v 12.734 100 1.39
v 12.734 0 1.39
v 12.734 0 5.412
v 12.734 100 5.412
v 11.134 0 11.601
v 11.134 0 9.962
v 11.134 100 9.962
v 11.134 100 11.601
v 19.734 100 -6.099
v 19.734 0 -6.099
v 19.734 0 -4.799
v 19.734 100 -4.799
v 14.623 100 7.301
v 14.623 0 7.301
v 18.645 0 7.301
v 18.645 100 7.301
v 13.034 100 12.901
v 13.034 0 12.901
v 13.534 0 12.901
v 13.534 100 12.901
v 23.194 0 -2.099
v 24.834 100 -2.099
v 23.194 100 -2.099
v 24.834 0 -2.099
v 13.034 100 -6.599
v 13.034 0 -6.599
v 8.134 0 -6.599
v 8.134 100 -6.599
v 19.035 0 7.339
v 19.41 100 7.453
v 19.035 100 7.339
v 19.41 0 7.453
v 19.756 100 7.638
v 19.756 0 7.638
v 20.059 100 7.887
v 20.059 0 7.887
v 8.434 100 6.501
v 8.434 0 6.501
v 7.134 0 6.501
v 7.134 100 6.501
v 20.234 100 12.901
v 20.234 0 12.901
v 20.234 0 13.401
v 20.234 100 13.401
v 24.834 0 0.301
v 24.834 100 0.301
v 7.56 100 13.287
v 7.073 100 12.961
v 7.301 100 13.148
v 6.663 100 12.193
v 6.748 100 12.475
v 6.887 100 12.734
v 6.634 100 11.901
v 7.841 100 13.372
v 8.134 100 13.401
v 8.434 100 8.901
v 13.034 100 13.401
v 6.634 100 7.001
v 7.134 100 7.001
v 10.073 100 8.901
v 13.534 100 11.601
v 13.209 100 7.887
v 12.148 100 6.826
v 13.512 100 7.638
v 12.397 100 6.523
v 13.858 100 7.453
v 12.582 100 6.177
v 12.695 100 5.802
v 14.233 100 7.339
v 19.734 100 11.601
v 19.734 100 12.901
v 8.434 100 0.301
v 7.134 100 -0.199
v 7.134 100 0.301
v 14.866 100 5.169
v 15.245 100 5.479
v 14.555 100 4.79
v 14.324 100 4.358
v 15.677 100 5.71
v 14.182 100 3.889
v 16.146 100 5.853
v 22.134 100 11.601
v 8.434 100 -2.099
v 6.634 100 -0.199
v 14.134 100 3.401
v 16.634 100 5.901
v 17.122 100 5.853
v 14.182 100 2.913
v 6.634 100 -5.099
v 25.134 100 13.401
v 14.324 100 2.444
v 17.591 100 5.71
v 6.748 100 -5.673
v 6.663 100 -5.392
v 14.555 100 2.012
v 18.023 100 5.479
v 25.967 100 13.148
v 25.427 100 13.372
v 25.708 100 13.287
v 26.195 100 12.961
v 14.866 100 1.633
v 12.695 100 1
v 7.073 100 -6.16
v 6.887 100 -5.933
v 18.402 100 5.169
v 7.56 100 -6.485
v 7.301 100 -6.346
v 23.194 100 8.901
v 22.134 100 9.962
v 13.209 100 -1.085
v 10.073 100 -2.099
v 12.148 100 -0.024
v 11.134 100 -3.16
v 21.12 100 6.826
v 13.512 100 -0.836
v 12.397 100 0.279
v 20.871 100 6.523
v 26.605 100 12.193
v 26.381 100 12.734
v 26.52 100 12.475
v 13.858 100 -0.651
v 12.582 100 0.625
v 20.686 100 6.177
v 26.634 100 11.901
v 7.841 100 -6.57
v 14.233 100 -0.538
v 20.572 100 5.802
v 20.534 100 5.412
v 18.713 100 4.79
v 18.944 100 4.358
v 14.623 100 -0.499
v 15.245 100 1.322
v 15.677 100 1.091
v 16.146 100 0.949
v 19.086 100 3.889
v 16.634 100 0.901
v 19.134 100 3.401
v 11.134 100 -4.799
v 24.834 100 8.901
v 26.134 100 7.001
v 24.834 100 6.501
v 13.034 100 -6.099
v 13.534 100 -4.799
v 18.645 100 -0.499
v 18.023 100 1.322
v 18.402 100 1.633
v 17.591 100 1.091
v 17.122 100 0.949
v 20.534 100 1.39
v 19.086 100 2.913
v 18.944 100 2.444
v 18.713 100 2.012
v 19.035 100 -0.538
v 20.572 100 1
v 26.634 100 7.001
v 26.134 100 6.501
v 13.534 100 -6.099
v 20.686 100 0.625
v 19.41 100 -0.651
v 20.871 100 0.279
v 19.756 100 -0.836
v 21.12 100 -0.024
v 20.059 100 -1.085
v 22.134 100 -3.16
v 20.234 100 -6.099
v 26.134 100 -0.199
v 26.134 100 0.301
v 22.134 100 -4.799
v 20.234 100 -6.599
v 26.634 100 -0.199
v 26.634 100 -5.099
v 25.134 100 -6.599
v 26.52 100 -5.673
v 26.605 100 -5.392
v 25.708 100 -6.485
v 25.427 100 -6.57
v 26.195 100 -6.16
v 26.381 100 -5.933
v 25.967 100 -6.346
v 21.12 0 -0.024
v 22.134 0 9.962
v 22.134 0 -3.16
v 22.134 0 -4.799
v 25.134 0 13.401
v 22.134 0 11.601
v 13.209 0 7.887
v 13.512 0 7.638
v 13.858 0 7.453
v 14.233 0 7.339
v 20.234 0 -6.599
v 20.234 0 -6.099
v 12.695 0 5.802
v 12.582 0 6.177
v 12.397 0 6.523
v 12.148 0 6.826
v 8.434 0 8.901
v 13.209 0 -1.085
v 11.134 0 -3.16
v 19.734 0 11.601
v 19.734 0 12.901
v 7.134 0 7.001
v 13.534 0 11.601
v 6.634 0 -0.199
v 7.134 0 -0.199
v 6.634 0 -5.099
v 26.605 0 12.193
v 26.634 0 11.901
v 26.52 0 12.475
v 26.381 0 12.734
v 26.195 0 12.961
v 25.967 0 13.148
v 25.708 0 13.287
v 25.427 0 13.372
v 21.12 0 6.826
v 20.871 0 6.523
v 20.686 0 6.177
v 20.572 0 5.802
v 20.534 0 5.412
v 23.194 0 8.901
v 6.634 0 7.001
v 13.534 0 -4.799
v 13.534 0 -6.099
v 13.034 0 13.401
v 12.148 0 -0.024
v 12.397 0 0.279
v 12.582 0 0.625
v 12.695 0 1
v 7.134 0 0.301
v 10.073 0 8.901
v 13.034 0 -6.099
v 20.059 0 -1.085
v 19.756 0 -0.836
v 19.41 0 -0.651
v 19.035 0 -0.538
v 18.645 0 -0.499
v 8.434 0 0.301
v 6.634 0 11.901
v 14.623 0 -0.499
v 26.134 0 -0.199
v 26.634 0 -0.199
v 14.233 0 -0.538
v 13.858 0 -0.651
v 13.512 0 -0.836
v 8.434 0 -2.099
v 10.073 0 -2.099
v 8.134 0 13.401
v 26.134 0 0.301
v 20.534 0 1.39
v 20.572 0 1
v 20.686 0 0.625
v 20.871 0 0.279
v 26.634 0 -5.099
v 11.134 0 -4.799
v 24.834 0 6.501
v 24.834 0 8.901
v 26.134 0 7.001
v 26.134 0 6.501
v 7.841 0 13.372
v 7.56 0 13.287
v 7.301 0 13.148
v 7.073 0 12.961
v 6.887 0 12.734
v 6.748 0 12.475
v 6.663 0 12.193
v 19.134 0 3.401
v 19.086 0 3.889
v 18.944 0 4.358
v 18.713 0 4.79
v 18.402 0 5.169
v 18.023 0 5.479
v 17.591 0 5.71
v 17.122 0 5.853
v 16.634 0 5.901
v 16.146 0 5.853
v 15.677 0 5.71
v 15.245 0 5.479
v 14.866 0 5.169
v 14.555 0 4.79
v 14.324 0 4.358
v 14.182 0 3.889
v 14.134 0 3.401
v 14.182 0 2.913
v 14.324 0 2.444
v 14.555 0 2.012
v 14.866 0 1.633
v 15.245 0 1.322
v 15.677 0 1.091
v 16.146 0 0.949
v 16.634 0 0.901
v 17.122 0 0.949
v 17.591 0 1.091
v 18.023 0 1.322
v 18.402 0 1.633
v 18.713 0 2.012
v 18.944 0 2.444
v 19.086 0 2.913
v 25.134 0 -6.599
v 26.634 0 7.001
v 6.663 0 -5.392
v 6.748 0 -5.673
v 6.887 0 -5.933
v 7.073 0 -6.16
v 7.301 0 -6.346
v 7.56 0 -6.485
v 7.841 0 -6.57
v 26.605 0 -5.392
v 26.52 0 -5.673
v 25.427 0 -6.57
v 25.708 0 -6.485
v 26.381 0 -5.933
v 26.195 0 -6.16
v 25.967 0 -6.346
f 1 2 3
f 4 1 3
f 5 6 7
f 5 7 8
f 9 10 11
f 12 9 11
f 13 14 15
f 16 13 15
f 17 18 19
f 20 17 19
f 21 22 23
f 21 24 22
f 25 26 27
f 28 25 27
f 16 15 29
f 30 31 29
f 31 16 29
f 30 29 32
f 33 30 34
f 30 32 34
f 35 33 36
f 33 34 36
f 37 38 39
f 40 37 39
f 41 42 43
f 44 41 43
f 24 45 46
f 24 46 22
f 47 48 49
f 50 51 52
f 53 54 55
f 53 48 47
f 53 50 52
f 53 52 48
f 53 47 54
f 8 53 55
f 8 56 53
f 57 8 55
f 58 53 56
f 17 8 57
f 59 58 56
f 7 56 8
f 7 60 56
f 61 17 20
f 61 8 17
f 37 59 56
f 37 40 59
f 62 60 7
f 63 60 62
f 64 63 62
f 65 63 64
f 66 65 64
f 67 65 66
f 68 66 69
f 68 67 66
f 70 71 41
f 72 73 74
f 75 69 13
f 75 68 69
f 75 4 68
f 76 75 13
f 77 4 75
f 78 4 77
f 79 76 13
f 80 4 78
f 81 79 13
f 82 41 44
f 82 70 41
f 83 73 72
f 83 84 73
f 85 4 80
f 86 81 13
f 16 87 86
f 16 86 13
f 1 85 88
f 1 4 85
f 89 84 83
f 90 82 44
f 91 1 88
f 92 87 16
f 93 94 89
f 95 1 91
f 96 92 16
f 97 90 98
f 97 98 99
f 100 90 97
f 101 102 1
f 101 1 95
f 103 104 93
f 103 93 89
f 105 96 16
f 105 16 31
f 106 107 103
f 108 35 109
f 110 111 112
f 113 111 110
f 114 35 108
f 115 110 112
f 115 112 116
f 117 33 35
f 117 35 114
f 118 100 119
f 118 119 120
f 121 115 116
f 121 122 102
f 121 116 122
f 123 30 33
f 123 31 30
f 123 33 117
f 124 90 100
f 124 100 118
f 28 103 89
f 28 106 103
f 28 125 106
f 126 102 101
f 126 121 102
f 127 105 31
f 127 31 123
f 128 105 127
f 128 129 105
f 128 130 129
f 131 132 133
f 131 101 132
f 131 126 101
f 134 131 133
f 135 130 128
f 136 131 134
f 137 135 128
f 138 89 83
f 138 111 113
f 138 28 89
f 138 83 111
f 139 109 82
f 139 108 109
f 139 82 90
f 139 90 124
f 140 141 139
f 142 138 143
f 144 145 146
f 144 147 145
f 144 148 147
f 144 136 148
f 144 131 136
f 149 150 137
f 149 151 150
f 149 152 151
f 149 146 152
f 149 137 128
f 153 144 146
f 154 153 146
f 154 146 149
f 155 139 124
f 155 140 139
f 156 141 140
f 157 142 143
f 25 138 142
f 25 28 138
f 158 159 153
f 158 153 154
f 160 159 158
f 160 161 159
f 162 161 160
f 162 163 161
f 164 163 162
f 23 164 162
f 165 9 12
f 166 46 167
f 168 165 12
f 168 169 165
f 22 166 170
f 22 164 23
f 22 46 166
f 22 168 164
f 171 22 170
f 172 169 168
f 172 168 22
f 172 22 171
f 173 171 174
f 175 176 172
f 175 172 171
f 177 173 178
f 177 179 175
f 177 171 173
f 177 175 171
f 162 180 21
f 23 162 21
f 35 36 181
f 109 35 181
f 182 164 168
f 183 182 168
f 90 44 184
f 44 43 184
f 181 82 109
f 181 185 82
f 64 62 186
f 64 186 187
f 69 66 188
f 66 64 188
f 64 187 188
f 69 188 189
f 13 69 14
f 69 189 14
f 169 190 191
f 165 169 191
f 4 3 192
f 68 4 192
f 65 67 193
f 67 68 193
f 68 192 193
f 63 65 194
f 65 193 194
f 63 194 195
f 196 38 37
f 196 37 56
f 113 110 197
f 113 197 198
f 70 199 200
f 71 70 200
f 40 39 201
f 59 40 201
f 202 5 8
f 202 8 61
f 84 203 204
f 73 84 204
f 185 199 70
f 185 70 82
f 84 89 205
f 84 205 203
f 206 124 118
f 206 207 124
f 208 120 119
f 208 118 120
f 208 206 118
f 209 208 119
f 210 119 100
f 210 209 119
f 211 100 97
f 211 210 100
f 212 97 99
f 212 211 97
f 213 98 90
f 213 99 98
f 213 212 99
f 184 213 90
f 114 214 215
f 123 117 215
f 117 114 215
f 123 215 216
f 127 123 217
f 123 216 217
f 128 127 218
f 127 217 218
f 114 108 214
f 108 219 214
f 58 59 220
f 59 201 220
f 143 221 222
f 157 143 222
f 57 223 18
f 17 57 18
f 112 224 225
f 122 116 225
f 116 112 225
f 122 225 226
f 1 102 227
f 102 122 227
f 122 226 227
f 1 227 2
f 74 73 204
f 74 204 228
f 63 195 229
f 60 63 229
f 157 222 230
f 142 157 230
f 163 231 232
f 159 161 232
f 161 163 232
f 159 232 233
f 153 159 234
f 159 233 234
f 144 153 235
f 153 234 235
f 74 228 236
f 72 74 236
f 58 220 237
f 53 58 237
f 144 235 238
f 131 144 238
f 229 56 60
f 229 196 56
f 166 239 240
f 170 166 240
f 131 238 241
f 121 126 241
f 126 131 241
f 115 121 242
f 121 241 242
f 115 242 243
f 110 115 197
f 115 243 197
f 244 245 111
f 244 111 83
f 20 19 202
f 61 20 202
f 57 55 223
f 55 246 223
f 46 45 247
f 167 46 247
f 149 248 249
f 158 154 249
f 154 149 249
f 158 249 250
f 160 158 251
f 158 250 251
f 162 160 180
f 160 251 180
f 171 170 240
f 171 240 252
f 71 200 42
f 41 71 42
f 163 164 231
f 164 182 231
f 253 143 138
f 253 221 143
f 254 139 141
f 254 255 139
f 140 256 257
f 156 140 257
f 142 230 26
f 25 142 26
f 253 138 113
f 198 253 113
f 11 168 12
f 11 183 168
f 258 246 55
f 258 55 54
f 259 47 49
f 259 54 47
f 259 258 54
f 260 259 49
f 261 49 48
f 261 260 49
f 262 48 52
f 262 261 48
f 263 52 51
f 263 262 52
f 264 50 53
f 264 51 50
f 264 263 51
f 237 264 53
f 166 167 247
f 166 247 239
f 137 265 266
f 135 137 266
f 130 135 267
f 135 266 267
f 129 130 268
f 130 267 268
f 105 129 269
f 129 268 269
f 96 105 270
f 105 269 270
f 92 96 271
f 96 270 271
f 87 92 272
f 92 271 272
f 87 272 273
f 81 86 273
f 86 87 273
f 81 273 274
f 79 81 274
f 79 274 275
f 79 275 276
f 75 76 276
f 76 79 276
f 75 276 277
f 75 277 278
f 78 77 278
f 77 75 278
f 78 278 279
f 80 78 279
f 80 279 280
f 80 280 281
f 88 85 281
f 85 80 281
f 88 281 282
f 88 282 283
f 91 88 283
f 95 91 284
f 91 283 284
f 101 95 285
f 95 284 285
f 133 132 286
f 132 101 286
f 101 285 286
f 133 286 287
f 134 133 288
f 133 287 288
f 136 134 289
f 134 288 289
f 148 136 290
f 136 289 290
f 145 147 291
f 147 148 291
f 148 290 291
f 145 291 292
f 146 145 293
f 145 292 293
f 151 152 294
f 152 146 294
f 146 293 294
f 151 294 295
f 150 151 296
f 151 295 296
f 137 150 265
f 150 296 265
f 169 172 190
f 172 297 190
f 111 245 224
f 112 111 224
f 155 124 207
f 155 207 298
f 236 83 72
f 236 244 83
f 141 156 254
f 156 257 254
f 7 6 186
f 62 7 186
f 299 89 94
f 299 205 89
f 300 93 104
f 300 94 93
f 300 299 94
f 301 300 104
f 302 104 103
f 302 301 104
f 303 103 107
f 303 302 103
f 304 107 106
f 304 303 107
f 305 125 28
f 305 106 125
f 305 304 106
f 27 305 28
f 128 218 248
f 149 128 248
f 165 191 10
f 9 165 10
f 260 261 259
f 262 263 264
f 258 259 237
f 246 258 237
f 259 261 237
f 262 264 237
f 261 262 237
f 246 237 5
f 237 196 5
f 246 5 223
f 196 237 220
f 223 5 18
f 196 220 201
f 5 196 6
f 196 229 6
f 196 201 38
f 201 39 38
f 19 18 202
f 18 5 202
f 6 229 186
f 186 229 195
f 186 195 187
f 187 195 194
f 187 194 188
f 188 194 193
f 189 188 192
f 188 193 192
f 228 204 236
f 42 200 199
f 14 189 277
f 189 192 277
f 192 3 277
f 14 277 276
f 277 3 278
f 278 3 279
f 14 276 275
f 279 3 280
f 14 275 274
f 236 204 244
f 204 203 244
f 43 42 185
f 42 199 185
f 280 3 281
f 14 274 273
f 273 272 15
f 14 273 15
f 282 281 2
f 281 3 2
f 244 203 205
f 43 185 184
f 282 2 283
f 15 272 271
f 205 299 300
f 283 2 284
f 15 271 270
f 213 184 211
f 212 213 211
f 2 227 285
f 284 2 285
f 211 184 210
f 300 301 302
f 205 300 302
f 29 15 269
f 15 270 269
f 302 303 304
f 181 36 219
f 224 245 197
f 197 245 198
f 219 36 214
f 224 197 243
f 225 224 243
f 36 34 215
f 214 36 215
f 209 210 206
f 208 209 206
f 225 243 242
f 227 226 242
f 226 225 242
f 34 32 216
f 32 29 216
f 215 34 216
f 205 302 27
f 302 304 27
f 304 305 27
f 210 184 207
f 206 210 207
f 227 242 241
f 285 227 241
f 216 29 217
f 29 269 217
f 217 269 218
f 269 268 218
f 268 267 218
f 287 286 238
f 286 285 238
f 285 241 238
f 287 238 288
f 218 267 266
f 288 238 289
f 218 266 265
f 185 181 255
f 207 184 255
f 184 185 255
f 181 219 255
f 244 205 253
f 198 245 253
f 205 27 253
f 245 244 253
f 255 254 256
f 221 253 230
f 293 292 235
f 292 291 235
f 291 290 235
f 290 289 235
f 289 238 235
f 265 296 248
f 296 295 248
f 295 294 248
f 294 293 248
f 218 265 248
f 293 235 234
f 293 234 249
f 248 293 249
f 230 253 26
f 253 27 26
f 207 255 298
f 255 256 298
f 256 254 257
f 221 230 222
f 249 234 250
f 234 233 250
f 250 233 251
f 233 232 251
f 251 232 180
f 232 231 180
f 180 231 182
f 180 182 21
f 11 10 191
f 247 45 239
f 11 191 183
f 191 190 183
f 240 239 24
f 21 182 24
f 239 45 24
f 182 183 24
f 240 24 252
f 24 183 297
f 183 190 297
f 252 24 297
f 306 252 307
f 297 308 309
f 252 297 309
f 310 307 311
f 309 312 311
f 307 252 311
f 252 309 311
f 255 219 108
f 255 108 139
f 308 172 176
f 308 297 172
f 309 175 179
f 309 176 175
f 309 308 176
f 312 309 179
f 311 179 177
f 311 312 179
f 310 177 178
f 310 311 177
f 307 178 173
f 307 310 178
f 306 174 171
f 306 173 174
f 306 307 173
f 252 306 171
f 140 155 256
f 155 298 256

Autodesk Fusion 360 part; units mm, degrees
sketch "Sketch1" plane through (0, 0, 0) normal (0, 1, 0) x (1, 0, 0)
  circle A0 centre (16.6339, -3.4008) radius 2.5
  line L0 (13.0339, 6.0992) -> (13.0339, 6.5992)
  line L1 (6.6339, 0.1992) -> (7.1339, 0.1992)
  line L2 (6.6339, 0.1992) -> (7.1339, 0.1992)
  line L3 (10.0732, 2.0992) -> (8.4339, 2.0992)
  line L4 (11.1339, 4.7992) -> (11.1339, 3.1598)
  line L5 (13.5339, 4.7992) -> (13.5339, 6.0992)
  line L6 (20.2339, 6.5992) -> (20.2339, 6.0992)
  line L7 (19.7339, 6.0992) -> (19.7339, 4.7992)
  line L8 (22.1339, 4.7992) -> (19.7339, 4.7992)
  line L9 (13.5339, 4.7992) -> (11.1339, 4.7992)
  line L10 (20.2339, 6.0992) -> (19.7339, 6.0992)
  line L11 (13.5339, 6.0992) -> (13.0339, 6.0992)
  line L12 (25.1339, 6.5992) -> (20.2339, 6.5992)
  line L13 (13.0339, 6.5992) -> (8.1339, 6.5992)
  line L14 (22.1339, 3.1598) -> (22.1339, 4.7992)
  line L15 (24.8339, 2.0992) -> (23.1945, 2.0992)
  line L16 (26.1339, 0.1992) -> (26.6339, 0.1992)
  line L17 (26.1339, 0.1992) -> (26.6339, 0.1992)
  line L18 (22.1339, 0.1992) -> (22.1339, 0.2882)
  line L19 (24.8339, -0.3008) -> (26.1339, -0.3008)
  line L20 (24.8339, -0.3008) -> (26.1339, -0.3008)
  line L21 (24.8339, -8.9008) -> (24.8339, -6.5008)
  line L22 (24.8339, -0.3008) -> (24.8339, 2.0992)
  line L23 (24.8339, -0.3008) -> (24.8339, 2.0992)
  line L24 (26.1339, -7.0008) -> (26.1339, -6.5008)
  line L25 (26.1339, -0.3008) -> (26.1339, 0.1992)
  line L26 (26.6339, -11.9008) -> (26.6339, -7.0008)
  line L27 (26.6339, 0.1992) -> (26.6339, 5.0992)
  line L28 (20.5339, -5.4117) -> (20.5339, -1.3899)
  line L29 (22.1339, 3.1598) -> (20.059, 1.085)
  line L30 (13.2087, 1.085) -> (11.1339, 3.1598)
  line L31 (12.7339, -1.3899) -> (12.7339, -5.4117)
  line L32 (11.1339, 0.1992) -> (11.2666, 0.1992)
  line L33 (18.6448, 0.4992) -> (14.623, 0.4992)
  line L34 (7.1339, -0.3008) -> (8.4339, -0.3008)
  line L35 (16.6339, -3.4008) -> (14.8661, -1.6331) construction
  line L36 (12.7339, 0.4992) -> (6.6339, 6.5992) construction
  line L37 (6.6339, 6.5992) -> (12.7339, 0.4992) construction
  line L38 (13.5339, -1.3615) -> (13.5339, -1.3216)
  line L39 (21.1197, 0.0243) -> (23.1945, 2.0992)
  line L40 (20.059, -7.8866) -> (22.1339, -9.9615)
  line L41 (14.8661, -1.6331) -> (17.1642, -3.9311) construction
  line L42 (26.6339, 6.5992) -> (16.1035, -3.9311) construction
  line L43 (15.0967, -3.8773) -> (14.9766, -3.9974)
  line L44 (15.854, -3.1201) -> (15.8242, -3.1498)
  line L45 (13.0339, -0.9862) -> (13.0339, -0.8615)
  line L46 (10.0732, 2.0992) -> (12.1481, 0.0243)
  line L47 (20.2339, -4.5168) -> (20.2339, -4.6968)
  line L48 (11.1339, -9.9615) -> (11.1339, -11.6008)
  line L49 (8.4339, 2.0992) -> (8.4339, -0.3008)
  line L50 (8.4339, -6.5008) -> (8.4339, -8.9008)
  line L51 (7.1339, 0.1992) -> (7.1339, -0.3008)
  line L52 (7.1339, -0.3008) -> (8.4339, -0.3008)
  line L53 (8.4339, 2.0992) -> (8.4339, -0.3008)
  line L54 (8.4339, -6.5008) -> (8.4339, -8.9008)
  line L55 (6.6339, 5.0992) -> (6.6339, 0.1992)
  line L56 (6.6339, -7.0008) -> (6.6339, -11.9008)
  line L57 (7.1339, -7.0008) -> (6.6339, -7.0008)
  line L58 (8.4339, -6.5008) -> (7.1339, -6.5008)
  line L59 (8.4339, -6.5008) -> (7.1339, -6.5008)
  line L60 (7.1339, -7.0008) -> (6.6339, -7.0008)
  line L61 (7.1339, -6.5008) -> (7.1339, -7.0008)
  line L62 (12.1481, -6.8259) -> (10.0732, -8.9008)
  line L63 (7.1339, -12.9008) -> (6.6339, -13.4008) construction
  line L64 (11.1339, -11.6008) -> (13.5339, -11.6008)
  line L65 (19.7339, -11.6008) -> (22.1339, -11.6008)
  line L66 (13.0339, -12.9008) -> (13.5339, -12.9008)
  line L67 (19.7339, -12.9008) -> (20.2339, -12.9008)
  line L68 (20.2339, -13.4008) -> (25.1339, -13.4008)
  line L69 (8.4339, -8.9008) -> (10.0732, -8.9008)
  line L70 (13.5339, -12.9008) -> (13.5339, -11.6008)
  line L71 (13.0339, -13.4008) -> (13.0339, -12.9008)
  line L72 (26.1339, -6.5008) -> (24.8339, -6.5008)
  line L73 (26.1339, -6.5008) -> (24.8339, -6.5008)
  line L74 (26.6339, -7.0008) -> (26.1339, -7.0008)
  line L75 (26.6339, -7.0008) -> (26.1339, -7.0008)
  line L76 (24.8339, -8.9008) -> (24.8339, -6.5008)
  line L77 (22.1339, -11.6008) -> (22.1339, -9.9615)
  line L78 (23.1945, -8.9008) -> (24.8339, -8.9008)
  line L79 (23.1945, -8.9008) -> (21.1197, -6.8259)
  line L80 (11.1339, -9.9615) -> (13.2087, -7.8866)
  line L81 (14.8661, -5.1686) -> (13.5339, -6.5008) construction
  line L82 (11.1339, -8.9008) -> (8.4339, -11.6008) construction
  line L83 (19.7339, -11.6008) -> (19.7339, -12.9008)
  line L84 (20.2339, -12.9008) -> (20.2339, -13.4008)
  line L85 (18.4016, -5.1686) -> (19.7339, -6.5008) construction
  line L86 (20.5339, -7.3008) -> (26.6339, -13.4008) construction
  line L87 (14.623, -7.3008) -> (18.6448, -7.3008)
  arc A1 (26.6339, 5.0992) -> (25.1339, 6.5992) centre (25.1339, 5.0992) ccw
  arc A2 (8.1339, 6.5992) -> (6.6339, 5.0992) centre (8.1339, 5.0992) ccw
  arc A3 (6.6339, -11.9008) -> (8.1339, -13.4008) centre (8.1339, -11.9008) ccw
  arc A4 (25.1339, -13.4008) -> (26.6339, -11.9008) centre (25.1339, -11.9008) ccw
  arc A5 (13.2087, 1.085) -> (14.623, 0.4992) centre (14.623, 2.4992) ccw
  arc A6 (18.6448, 0.4992) -> (20.059, 1.085) centre (18.6448, 2.4992) ccw
  arc A7 (21.1197, 0.0243) -> (20.5339, -1.3899) centre (22.5339, -1.3899) ccw
  arc A8 (20.5339, -5.4117) -> (21.1197, -6.8259) centre (22.5339, -5.4117) ccw
  arc A9 (20.059, -7.8866) -> (18.6448, -7.3008) centre (18.6448, -9.3008) ccw
  arc A10 (14.623, -7.3008) -> (13.2087, -7.8866) centre (14.623, -9.3008) ccw
  arc A11 (12.1481, -6.8259) -> (12.7339, -5.4117) centre (10.7339, -5.4117) ccw
  arc A12 (12.7339, -1.3899) -> (12.1481, 0.0243) centre (10.7339, -1.3899) ccw
  line L88 (8.1339, -13.4008) -> (13.0339, -13.4008)
  dimension "d1" = 5
  dimension "d2" = 20
  dimension "d3" = 20
  dimension "d8" = 7.2
  dimension "d10" = 7.2
  dimension "d12" = 7.2
  dimension "d14" = 11
  dimension "d15" = 11
  dimension "d17" = 1.5
  dimension "d18" = 1.5
  dimension "d19" = 2
extrude "Extrude1" add sketch "Sketch1" along normal blind 100
equation "Length = 100 mm"
